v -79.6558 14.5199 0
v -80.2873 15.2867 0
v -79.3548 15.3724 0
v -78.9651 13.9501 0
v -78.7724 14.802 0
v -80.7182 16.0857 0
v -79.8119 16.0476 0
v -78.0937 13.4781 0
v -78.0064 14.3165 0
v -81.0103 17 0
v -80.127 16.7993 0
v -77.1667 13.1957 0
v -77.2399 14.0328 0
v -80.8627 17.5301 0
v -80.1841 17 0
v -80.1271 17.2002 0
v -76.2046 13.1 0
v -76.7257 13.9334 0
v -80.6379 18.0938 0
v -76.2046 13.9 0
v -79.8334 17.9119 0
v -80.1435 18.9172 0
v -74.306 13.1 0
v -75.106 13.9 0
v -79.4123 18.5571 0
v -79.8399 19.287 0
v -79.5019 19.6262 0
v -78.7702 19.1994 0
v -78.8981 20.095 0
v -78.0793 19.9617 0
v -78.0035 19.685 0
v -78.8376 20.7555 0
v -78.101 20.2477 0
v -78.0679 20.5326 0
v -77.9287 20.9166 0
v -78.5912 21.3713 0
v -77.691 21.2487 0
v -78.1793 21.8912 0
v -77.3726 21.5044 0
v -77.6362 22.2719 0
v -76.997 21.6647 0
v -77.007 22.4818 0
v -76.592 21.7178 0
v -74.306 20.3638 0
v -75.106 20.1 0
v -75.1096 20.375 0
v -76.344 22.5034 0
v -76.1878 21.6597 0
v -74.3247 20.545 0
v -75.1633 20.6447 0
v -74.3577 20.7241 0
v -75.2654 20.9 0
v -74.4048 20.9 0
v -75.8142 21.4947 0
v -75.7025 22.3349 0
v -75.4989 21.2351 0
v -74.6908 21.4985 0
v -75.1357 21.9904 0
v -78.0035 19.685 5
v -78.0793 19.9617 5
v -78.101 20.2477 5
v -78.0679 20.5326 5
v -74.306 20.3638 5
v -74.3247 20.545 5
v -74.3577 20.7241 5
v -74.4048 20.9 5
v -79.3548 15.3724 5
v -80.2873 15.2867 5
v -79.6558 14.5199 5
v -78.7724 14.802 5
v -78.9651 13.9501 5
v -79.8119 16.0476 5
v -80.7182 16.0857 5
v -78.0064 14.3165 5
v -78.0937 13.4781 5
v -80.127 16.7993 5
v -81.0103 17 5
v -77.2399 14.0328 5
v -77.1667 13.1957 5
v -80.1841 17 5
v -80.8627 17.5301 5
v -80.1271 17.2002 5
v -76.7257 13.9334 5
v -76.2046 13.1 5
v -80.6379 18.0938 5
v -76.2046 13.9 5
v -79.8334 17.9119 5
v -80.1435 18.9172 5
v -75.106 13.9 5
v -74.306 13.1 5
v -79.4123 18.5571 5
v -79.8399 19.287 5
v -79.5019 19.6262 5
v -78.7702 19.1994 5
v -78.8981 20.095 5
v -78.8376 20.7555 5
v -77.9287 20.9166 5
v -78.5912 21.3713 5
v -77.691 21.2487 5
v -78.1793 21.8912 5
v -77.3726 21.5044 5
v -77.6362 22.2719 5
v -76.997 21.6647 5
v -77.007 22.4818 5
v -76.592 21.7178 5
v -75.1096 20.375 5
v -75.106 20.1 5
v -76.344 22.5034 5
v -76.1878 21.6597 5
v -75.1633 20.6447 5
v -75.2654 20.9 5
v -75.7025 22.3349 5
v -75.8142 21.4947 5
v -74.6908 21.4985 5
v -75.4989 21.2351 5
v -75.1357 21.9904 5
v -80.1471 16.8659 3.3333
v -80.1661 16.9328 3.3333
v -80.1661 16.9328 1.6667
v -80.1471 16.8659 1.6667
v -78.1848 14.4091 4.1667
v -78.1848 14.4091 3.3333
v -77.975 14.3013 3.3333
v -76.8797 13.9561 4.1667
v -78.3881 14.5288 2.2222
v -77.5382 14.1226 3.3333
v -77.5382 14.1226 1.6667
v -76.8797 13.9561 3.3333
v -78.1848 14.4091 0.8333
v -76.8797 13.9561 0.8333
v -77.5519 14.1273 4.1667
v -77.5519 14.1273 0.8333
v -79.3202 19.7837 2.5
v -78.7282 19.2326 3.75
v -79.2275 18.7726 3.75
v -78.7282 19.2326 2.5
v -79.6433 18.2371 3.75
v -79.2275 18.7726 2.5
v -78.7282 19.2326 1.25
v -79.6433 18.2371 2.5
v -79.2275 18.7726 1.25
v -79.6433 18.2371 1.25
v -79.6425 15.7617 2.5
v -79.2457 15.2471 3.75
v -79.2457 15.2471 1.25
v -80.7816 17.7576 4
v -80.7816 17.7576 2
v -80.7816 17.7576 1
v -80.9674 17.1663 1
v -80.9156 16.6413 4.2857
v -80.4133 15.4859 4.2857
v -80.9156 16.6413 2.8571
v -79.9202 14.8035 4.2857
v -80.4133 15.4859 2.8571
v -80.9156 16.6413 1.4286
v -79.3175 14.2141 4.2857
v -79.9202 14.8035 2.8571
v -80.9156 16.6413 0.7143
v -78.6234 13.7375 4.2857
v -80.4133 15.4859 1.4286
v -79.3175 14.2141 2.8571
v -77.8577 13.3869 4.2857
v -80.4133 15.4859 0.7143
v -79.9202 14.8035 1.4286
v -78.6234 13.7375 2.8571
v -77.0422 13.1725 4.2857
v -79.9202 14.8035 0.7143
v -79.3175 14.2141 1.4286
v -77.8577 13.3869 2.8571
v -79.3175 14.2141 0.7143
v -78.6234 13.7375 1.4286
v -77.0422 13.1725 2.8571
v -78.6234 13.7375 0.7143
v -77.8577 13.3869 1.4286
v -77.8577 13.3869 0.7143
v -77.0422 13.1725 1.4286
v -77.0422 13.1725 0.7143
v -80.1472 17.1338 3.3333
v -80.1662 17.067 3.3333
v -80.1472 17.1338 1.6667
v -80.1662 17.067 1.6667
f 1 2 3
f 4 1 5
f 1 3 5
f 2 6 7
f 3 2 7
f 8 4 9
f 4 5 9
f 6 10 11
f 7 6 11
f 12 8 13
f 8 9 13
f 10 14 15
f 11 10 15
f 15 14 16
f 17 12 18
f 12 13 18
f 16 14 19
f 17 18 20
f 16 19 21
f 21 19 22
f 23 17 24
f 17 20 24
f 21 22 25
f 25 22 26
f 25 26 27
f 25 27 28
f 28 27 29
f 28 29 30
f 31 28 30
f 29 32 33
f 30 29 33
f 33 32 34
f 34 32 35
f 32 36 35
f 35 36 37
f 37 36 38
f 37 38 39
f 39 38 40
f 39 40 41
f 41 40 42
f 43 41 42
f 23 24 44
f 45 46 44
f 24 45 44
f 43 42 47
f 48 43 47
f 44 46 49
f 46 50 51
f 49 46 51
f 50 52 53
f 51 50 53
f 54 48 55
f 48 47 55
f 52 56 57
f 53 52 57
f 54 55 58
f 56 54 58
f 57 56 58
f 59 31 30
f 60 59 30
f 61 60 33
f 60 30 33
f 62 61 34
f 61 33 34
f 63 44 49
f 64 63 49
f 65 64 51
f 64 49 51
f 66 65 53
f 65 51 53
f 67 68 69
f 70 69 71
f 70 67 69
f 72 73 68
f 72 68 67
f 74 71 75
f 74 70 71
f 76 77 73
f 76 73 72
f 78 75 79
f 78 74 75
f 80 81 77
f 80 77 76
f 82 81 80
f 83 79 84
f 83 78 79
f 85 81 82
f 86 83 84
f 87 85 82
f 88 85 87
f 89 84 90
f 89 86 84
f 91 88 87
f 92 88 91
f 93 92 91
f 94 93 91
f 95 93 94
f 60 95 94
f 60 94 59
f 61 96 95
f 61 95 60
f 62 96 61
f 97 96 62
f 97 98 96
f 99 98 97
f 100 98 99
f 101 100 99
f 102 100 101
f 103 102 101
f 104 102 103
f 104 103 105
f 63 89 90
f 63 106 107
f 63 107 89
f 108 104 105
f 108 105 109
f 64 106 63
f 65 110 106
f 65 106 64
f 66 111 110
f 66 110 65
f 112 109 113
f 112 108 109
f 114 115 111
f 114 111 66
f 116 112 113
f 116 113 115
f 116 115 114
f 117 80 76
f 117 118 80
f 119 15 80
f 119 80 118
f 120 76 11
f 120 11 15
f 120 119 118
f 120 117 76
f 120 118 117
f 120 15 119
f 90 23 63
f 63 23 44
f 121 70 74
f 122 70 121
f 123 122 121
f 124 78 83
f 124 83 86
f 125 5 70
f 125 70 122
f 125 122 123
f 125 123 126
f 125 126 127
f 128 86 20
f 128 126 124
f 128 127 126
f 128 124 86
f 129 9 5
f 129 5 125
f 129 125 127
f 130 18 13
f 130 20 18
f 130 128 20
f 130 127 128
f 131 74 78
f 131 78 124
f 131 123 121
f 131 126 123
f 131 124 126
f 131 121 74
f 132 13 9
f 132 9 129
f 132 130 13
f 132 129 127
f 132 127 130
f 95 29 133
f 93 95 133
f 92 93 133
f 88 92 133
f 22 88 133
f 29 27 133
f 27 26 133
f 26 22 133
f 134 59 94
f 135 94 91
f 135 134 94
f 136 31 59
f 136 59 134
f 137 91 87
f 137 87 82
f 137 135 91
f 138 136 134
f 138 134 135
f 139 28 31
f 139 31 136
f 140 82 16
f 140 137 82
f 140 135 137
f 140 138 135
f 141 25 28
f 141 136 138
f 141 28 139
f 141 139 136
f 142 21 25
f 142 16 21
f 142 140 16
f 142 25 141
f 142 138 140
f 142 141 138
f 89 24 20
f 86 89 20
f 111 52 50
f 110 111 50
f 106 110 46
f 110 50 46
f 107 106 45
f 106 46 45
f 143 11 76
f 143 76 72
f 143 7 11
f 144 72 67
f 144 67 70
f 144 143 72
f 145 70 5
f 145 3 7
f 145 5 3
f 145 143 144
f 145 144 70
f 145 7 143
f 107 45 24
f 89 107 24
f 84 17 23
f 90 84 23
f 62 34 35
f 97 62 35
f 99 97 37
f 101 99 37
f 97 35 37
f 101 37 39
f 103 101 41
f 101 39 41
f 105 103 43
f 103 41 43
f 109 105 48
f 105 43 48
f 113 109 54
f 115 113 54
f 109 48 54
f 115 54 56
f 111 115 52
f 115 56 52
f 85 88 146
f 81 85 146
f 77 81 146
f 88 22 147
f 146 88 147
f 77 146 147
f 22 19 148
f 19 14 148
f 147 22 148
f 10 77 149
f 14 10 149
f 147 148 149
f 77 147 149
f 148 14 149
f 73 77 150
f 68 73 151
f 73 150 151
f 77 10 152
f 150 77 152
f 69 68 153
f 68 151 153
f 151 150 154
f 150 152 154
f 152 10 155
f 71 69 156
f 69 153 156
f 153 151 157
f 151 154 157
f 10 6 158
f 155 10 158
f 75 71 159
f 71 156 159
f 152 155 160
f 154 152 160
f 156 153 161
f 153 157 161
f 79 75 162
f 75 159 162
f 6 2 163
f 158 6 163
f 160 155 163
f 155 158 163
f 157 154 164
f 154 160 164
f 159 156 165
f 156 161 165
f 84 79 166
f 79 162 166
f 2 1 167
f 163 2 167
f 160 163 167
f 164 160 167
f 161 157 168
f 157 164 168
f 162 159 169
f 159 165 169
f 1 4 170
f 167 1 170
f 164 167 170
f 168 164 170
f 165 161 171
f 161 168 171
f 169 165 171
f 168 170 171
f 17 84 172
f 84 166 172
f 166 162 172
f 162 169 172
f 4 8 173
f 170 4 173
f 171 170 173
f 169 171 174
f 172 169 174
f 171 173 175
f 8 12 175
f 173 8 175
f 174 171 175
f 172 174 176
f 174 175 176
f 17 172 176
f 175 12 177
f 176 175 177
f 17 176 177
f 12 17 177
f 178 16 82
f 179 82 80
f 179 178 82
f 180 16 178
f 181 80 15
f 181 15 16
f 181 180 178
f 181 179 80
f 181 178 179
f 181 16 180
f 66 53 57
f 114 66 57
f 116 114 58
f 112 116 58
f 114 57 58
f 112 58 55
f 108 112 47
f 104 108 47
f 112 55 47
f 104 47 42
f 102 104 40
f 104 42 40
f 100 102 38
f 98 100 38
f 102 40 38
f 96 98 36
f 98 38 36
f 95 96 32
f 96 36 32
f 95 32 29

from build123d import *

# Parameters (mm, degrees)
BOSS_EXTRUDE1_DEPTH = 5


with BuildPart() as part:
    # Sketch1 → Boss-Extrude1 (new body)
    with BuildSketch(Plane.XY):
        with BuildLine():
            ThreePointArc((-75.265428178, 20.9), (-75.130279043, 20.511046865), (-75.105982855, 20.1))
            Line((-75.105982855, 20.1), (-75.105982855, 19.853719883))
            add(Edge.make_bspline(
                [(-74.305982855, 19.570019979), (-74.57545788, 19.689791559), (-74.842109989, 19.784227542), (-75.105982855, 19.853719883)],
                knots=[-0.347916047, -0.347916047, -0.347916047, -0.347916047, -0.203467167, -0.203467167, -0.203467167, -0.203467167], degree=3))
            Line((-74.305982855, 19.570019979), (-74.305982855, 20.071878785))
            Line((-74.305982855, 20.071878785), (-74.305982855, 20.363828129))
            ThreePointArc((-74.305982855, 20.363828129), (-74.339463682, 20.634853388), (-74.404831342, 20.9))
            Line((-74.404831342, 20.9), (-75.265428178, 20.9))
        make_face()
        with BuildLine():
            add(Edge.make_bspline(
                [(-74.305982855, 19.570019979), (-74.57545788, 19.689791559), (-74.842109989, 19.784227542), (-75.105982855, 19.853719883)],
                knots=[-0.347916047, -0.347916047, -0.347916047, -0.347916047, -0.203467167, -0.203467167, -0.203467167, -0.203467167], degree=3))
            Line((-75.105982855, 19.853719883), (-75.105982855, 16.984329869))
            Line((-75.105982855, 16.984329869), (-75.105982855, 14.140403881))
            add(Edge.make_bspline(
                [(-75.105982855, 14.140403881), (-74.843255413, 14.206157854), (-74.576591527, 14.295030515), (-74.305982855, 14.407070854)],
                knots=[1.201768628, 1.201768628, 1.201768628, 1.201768628, 1.343435707, 1.343435707, 1.343435707, 1.343435707], degree=3))
            Line((-74.305982855, 14.407070854), (-74.305982855, 17.699135935))
            Line((-74.305982855, 17.699135935), (-74.305982855, 19.570019979))
        make_face()
        with BuildLine():
            ThreePointArc((-78.067947351, 20.532623393), (-76.79630986, 21.70512917), (-75.265428178, 20.9))
            Line((-75.265428178, 20.9), (-74.404831342, 20.9))
            ThreePointArc((-74.404831342, 20.9), (-77.006960237, 22.481805089), (-78.898061562, 20.094983372))
            add(Edge.make_bspline(
                [(-78.067947351, 20.532623393), (-78.358359688, 20.413646492), (-78.636457372, 20.266940111), (-78.898061562, 20.094983372)],
                knots=[0.295059063, 0.295059063, 0.295059063, 0.295059063, 0.440738585, 0.440738585, 0.440738585, 0.440738585], degree=3))
        make_face()
        with BuildLine():
            add(Edge.make_bspline(
                [(-78.003515184, 19.685010862), (-78.104869219, 19.63560007), (-78.355344555, 19.500363503), (-78.967656438, 19.082169769), (-79.659987233, 18.331266584), (-80.013929538, 17.564650836), (-80.12711921, 17.200243393)],
                knots=[0.344074201, 0.344074201, 0.344074201, 0.344074201, 0.406881084, 0.502455065, 0.753682598, 0.966213979, 0.966213979, 0.966213979, 0.966213979], degree=3))
            ThreePointArc((-78.003515184, 19.685010862), (-78.097030736, 20.104157384), (-78.067947351, 20.532623393))
            add(Edge.make_bspline(
                [(-78.067947351, 20.532623393), (-78.358359688, 20.413646492), (-78.636457372, 20.266940111), (-78.898061562, 20.094983372)],
                knots=[0.295059063, 0.295059063, 0.295059063, 0.295059063, 0.440738585, 0.440738585, 0.440738585, 0.440738585], degree=3))
            add(Edge.make_bspline(
                [(-78.898061562, 20.094983372), (-79.044158498, 19.998951452), (-79.506474474, 19.658143157), (-79.905620688, 19.237259361), (-80.14350503, 18.917192132)],
                knots=[0.440738585, 0.440738585, 0.440738585, 0.440738585, 0.522095585, 0.707584074, 0.707584074, 0.707584074, 0.707584074], degree=3))
            add(Edge.make_bspline(
                [(-80.143505006, 18.917192121), (-80.243393446, 18.301629507), (-80.235757559, 17.730205674), (-80.12711921, 17.200243393)],
                knots=[-0.342301016, -0.342301016, -0.342301016, -0.342301016, -0.038630201, -0.038630201, -0.038630201, -0.038630201], degree=3))
        make_face()
        with BuildLine():
            add(Edge.make_bspline(
                [(-80.12711921, 17.200243393), (-80.147727954, 17.133894765), (-80.166711829, 17.067112434), (-80.184053986, 17)],
                knots=[0.966213979, 0.966213979, 0.966213979, 0.966213979, 1.00491013, 1.00491013, 1.00491013, 1.00491013], degree=3))
            add(Edge.make_bspline(
                [(-80.143505006, 18.917192121), (-80.243393446, 18.301629507), (-80.235757559, 17.730205674), (-80.12711921, 17.200243393)],
                knots=[-0.342301016, -0.342301016, -0.342301016, -0.342301016, -0.038630201, -0.038630201, -0.038630201, -0.038630201], degree=3))
            add(Edge.make_bspline(
                [(-80.14350503, 18.917192132), (-80.240407946, 18.786811765), (-80.486796547, 18.418759671), (-80.740911848, 17.89685783), (-80.901091234, 17.421401242), (-80.969166274, 17.159575272), (-80.996010355, 17.055421709), (-81.010331575, 17)],
                knots=[0.707584074, 0.707584074, 0.707584074, 0.707584074, 0.783143378, 0.913667274, 0.978929222, 1.011560196, 1.044191171, 1.044191171, 1.044191171, 1.044191171], degree=3))
            add(Edge.make_bspline(
                [(-81.010331575, 17), (-80.995912214, 16.944198497), (-80.968881368, 16.839270604), (-80.900356676, 16.576013924), (-80.741671714, 16.105170367), (-80.311695813, 15.221571956), (-79.37871474, 14.137722448), (-77.891914282, 13.2952625), (-76.763881291, 13.1), (-76.204616771, 13.1)],
                knots=[-0.043877202, -0.043877202, -0.043877202, -0.043877202, -0.011256039, 0.021365123, 0.086607448, 0.217092099, 0.478061399, 0.7390307, 1, 1, 1, 1], degree=3))
            Line((-76.204616771, 13.1), (-74.305982855, 13.1))
            Line((-74.305982855, 13.1), (-74.305982855, 14.407070854))
            add(Edge.make_bspline(
                [(-75.105982855, 14.140403881), (-74.843255413, 14.206157854), (-74.576591527, 14.295030515), (-74.305982855, 14.407070854)],
                knots=[1.201768628, 1.201768628, 1.201768628, 1.201768628, 1.343435707, 1.343435707, 1.343435707, 1.343435707], degree=3))
            Line((-75.105982855, 14.140403881), (-75.105982855, 13.9))
            Line((-75.105982855, 13.9), (-76.204616771, 13.9))
            add(Edge.make_bspline(
                [(-78.772417568, 14.802007342), (-78.757445413, 14.790011818), (-78.387128598, 14.497563572), (-77.563800223, 14.051022081), (-76.655306258, 13.9), (-76.204616771, 13.9)],
                knots=[0.48691566, 0.48691566, 0.48691566, 0.48691566, 0.497562378, 0.748781189, 1, 1, 1, 1], degree=3))
            add(Edge.make_bspline(
                [(-80.126958505, 16.799254372), (-80.350350695, 15.691334532), (-80.041454579, 14.614718165), (-78.772417566, 14.802007352)],
                knots=[1.039358775, 1.039358775, 1.039358775, 1.039358775, 1.69125552, 1.69125552, 1.69125552, 1.69125552], degree=3))
            add(Edge.make_bspline(
                [(-80.184053986, 17), (-80.166668157, 16.932718561), (-80.147630382, 16.865768509), (-80.126958505, 16.799254372)],
                knots=[-0.004875245, -0.004875245, -0.004875245, -0.004875245, 0.033874117, 0.033874117, 0.033874117, 0.033874117], degree=3))
        make_face()
        with BuildLine():
            add(Edge.make_bspline(
                [(-80.126958505, 16.799254372), (-80.01361103, 16.434545856), (-79.667166625, 15.684835242), (-79.110726777, 15.07305693), (-78.772417568, 14.802007342)],
                knots=[0.033874117, 0.033874117, 0.033874117, 0.033874117, 0.246343567, 0.48691566, 0.48691566, 0.48691566, 0.48691566], degree=3))
            add(Edge.make_bspline(
                [(-80.126958505, 16.799254372), (-80.350350695, 15.691334532), (-80.041454579, 14.614718165), (-78.772417566, 14.802007352)],
                knots=[1.039358775, 1.039358775, 1.039358775, 1.039358775, 1.69125552, 1.69125552, 1.69125552, 1.69125552], degree=3))
        make_face()
    extrude(amount=BOSS_EXTRUDE1_DEPTH)


solid = part.part
